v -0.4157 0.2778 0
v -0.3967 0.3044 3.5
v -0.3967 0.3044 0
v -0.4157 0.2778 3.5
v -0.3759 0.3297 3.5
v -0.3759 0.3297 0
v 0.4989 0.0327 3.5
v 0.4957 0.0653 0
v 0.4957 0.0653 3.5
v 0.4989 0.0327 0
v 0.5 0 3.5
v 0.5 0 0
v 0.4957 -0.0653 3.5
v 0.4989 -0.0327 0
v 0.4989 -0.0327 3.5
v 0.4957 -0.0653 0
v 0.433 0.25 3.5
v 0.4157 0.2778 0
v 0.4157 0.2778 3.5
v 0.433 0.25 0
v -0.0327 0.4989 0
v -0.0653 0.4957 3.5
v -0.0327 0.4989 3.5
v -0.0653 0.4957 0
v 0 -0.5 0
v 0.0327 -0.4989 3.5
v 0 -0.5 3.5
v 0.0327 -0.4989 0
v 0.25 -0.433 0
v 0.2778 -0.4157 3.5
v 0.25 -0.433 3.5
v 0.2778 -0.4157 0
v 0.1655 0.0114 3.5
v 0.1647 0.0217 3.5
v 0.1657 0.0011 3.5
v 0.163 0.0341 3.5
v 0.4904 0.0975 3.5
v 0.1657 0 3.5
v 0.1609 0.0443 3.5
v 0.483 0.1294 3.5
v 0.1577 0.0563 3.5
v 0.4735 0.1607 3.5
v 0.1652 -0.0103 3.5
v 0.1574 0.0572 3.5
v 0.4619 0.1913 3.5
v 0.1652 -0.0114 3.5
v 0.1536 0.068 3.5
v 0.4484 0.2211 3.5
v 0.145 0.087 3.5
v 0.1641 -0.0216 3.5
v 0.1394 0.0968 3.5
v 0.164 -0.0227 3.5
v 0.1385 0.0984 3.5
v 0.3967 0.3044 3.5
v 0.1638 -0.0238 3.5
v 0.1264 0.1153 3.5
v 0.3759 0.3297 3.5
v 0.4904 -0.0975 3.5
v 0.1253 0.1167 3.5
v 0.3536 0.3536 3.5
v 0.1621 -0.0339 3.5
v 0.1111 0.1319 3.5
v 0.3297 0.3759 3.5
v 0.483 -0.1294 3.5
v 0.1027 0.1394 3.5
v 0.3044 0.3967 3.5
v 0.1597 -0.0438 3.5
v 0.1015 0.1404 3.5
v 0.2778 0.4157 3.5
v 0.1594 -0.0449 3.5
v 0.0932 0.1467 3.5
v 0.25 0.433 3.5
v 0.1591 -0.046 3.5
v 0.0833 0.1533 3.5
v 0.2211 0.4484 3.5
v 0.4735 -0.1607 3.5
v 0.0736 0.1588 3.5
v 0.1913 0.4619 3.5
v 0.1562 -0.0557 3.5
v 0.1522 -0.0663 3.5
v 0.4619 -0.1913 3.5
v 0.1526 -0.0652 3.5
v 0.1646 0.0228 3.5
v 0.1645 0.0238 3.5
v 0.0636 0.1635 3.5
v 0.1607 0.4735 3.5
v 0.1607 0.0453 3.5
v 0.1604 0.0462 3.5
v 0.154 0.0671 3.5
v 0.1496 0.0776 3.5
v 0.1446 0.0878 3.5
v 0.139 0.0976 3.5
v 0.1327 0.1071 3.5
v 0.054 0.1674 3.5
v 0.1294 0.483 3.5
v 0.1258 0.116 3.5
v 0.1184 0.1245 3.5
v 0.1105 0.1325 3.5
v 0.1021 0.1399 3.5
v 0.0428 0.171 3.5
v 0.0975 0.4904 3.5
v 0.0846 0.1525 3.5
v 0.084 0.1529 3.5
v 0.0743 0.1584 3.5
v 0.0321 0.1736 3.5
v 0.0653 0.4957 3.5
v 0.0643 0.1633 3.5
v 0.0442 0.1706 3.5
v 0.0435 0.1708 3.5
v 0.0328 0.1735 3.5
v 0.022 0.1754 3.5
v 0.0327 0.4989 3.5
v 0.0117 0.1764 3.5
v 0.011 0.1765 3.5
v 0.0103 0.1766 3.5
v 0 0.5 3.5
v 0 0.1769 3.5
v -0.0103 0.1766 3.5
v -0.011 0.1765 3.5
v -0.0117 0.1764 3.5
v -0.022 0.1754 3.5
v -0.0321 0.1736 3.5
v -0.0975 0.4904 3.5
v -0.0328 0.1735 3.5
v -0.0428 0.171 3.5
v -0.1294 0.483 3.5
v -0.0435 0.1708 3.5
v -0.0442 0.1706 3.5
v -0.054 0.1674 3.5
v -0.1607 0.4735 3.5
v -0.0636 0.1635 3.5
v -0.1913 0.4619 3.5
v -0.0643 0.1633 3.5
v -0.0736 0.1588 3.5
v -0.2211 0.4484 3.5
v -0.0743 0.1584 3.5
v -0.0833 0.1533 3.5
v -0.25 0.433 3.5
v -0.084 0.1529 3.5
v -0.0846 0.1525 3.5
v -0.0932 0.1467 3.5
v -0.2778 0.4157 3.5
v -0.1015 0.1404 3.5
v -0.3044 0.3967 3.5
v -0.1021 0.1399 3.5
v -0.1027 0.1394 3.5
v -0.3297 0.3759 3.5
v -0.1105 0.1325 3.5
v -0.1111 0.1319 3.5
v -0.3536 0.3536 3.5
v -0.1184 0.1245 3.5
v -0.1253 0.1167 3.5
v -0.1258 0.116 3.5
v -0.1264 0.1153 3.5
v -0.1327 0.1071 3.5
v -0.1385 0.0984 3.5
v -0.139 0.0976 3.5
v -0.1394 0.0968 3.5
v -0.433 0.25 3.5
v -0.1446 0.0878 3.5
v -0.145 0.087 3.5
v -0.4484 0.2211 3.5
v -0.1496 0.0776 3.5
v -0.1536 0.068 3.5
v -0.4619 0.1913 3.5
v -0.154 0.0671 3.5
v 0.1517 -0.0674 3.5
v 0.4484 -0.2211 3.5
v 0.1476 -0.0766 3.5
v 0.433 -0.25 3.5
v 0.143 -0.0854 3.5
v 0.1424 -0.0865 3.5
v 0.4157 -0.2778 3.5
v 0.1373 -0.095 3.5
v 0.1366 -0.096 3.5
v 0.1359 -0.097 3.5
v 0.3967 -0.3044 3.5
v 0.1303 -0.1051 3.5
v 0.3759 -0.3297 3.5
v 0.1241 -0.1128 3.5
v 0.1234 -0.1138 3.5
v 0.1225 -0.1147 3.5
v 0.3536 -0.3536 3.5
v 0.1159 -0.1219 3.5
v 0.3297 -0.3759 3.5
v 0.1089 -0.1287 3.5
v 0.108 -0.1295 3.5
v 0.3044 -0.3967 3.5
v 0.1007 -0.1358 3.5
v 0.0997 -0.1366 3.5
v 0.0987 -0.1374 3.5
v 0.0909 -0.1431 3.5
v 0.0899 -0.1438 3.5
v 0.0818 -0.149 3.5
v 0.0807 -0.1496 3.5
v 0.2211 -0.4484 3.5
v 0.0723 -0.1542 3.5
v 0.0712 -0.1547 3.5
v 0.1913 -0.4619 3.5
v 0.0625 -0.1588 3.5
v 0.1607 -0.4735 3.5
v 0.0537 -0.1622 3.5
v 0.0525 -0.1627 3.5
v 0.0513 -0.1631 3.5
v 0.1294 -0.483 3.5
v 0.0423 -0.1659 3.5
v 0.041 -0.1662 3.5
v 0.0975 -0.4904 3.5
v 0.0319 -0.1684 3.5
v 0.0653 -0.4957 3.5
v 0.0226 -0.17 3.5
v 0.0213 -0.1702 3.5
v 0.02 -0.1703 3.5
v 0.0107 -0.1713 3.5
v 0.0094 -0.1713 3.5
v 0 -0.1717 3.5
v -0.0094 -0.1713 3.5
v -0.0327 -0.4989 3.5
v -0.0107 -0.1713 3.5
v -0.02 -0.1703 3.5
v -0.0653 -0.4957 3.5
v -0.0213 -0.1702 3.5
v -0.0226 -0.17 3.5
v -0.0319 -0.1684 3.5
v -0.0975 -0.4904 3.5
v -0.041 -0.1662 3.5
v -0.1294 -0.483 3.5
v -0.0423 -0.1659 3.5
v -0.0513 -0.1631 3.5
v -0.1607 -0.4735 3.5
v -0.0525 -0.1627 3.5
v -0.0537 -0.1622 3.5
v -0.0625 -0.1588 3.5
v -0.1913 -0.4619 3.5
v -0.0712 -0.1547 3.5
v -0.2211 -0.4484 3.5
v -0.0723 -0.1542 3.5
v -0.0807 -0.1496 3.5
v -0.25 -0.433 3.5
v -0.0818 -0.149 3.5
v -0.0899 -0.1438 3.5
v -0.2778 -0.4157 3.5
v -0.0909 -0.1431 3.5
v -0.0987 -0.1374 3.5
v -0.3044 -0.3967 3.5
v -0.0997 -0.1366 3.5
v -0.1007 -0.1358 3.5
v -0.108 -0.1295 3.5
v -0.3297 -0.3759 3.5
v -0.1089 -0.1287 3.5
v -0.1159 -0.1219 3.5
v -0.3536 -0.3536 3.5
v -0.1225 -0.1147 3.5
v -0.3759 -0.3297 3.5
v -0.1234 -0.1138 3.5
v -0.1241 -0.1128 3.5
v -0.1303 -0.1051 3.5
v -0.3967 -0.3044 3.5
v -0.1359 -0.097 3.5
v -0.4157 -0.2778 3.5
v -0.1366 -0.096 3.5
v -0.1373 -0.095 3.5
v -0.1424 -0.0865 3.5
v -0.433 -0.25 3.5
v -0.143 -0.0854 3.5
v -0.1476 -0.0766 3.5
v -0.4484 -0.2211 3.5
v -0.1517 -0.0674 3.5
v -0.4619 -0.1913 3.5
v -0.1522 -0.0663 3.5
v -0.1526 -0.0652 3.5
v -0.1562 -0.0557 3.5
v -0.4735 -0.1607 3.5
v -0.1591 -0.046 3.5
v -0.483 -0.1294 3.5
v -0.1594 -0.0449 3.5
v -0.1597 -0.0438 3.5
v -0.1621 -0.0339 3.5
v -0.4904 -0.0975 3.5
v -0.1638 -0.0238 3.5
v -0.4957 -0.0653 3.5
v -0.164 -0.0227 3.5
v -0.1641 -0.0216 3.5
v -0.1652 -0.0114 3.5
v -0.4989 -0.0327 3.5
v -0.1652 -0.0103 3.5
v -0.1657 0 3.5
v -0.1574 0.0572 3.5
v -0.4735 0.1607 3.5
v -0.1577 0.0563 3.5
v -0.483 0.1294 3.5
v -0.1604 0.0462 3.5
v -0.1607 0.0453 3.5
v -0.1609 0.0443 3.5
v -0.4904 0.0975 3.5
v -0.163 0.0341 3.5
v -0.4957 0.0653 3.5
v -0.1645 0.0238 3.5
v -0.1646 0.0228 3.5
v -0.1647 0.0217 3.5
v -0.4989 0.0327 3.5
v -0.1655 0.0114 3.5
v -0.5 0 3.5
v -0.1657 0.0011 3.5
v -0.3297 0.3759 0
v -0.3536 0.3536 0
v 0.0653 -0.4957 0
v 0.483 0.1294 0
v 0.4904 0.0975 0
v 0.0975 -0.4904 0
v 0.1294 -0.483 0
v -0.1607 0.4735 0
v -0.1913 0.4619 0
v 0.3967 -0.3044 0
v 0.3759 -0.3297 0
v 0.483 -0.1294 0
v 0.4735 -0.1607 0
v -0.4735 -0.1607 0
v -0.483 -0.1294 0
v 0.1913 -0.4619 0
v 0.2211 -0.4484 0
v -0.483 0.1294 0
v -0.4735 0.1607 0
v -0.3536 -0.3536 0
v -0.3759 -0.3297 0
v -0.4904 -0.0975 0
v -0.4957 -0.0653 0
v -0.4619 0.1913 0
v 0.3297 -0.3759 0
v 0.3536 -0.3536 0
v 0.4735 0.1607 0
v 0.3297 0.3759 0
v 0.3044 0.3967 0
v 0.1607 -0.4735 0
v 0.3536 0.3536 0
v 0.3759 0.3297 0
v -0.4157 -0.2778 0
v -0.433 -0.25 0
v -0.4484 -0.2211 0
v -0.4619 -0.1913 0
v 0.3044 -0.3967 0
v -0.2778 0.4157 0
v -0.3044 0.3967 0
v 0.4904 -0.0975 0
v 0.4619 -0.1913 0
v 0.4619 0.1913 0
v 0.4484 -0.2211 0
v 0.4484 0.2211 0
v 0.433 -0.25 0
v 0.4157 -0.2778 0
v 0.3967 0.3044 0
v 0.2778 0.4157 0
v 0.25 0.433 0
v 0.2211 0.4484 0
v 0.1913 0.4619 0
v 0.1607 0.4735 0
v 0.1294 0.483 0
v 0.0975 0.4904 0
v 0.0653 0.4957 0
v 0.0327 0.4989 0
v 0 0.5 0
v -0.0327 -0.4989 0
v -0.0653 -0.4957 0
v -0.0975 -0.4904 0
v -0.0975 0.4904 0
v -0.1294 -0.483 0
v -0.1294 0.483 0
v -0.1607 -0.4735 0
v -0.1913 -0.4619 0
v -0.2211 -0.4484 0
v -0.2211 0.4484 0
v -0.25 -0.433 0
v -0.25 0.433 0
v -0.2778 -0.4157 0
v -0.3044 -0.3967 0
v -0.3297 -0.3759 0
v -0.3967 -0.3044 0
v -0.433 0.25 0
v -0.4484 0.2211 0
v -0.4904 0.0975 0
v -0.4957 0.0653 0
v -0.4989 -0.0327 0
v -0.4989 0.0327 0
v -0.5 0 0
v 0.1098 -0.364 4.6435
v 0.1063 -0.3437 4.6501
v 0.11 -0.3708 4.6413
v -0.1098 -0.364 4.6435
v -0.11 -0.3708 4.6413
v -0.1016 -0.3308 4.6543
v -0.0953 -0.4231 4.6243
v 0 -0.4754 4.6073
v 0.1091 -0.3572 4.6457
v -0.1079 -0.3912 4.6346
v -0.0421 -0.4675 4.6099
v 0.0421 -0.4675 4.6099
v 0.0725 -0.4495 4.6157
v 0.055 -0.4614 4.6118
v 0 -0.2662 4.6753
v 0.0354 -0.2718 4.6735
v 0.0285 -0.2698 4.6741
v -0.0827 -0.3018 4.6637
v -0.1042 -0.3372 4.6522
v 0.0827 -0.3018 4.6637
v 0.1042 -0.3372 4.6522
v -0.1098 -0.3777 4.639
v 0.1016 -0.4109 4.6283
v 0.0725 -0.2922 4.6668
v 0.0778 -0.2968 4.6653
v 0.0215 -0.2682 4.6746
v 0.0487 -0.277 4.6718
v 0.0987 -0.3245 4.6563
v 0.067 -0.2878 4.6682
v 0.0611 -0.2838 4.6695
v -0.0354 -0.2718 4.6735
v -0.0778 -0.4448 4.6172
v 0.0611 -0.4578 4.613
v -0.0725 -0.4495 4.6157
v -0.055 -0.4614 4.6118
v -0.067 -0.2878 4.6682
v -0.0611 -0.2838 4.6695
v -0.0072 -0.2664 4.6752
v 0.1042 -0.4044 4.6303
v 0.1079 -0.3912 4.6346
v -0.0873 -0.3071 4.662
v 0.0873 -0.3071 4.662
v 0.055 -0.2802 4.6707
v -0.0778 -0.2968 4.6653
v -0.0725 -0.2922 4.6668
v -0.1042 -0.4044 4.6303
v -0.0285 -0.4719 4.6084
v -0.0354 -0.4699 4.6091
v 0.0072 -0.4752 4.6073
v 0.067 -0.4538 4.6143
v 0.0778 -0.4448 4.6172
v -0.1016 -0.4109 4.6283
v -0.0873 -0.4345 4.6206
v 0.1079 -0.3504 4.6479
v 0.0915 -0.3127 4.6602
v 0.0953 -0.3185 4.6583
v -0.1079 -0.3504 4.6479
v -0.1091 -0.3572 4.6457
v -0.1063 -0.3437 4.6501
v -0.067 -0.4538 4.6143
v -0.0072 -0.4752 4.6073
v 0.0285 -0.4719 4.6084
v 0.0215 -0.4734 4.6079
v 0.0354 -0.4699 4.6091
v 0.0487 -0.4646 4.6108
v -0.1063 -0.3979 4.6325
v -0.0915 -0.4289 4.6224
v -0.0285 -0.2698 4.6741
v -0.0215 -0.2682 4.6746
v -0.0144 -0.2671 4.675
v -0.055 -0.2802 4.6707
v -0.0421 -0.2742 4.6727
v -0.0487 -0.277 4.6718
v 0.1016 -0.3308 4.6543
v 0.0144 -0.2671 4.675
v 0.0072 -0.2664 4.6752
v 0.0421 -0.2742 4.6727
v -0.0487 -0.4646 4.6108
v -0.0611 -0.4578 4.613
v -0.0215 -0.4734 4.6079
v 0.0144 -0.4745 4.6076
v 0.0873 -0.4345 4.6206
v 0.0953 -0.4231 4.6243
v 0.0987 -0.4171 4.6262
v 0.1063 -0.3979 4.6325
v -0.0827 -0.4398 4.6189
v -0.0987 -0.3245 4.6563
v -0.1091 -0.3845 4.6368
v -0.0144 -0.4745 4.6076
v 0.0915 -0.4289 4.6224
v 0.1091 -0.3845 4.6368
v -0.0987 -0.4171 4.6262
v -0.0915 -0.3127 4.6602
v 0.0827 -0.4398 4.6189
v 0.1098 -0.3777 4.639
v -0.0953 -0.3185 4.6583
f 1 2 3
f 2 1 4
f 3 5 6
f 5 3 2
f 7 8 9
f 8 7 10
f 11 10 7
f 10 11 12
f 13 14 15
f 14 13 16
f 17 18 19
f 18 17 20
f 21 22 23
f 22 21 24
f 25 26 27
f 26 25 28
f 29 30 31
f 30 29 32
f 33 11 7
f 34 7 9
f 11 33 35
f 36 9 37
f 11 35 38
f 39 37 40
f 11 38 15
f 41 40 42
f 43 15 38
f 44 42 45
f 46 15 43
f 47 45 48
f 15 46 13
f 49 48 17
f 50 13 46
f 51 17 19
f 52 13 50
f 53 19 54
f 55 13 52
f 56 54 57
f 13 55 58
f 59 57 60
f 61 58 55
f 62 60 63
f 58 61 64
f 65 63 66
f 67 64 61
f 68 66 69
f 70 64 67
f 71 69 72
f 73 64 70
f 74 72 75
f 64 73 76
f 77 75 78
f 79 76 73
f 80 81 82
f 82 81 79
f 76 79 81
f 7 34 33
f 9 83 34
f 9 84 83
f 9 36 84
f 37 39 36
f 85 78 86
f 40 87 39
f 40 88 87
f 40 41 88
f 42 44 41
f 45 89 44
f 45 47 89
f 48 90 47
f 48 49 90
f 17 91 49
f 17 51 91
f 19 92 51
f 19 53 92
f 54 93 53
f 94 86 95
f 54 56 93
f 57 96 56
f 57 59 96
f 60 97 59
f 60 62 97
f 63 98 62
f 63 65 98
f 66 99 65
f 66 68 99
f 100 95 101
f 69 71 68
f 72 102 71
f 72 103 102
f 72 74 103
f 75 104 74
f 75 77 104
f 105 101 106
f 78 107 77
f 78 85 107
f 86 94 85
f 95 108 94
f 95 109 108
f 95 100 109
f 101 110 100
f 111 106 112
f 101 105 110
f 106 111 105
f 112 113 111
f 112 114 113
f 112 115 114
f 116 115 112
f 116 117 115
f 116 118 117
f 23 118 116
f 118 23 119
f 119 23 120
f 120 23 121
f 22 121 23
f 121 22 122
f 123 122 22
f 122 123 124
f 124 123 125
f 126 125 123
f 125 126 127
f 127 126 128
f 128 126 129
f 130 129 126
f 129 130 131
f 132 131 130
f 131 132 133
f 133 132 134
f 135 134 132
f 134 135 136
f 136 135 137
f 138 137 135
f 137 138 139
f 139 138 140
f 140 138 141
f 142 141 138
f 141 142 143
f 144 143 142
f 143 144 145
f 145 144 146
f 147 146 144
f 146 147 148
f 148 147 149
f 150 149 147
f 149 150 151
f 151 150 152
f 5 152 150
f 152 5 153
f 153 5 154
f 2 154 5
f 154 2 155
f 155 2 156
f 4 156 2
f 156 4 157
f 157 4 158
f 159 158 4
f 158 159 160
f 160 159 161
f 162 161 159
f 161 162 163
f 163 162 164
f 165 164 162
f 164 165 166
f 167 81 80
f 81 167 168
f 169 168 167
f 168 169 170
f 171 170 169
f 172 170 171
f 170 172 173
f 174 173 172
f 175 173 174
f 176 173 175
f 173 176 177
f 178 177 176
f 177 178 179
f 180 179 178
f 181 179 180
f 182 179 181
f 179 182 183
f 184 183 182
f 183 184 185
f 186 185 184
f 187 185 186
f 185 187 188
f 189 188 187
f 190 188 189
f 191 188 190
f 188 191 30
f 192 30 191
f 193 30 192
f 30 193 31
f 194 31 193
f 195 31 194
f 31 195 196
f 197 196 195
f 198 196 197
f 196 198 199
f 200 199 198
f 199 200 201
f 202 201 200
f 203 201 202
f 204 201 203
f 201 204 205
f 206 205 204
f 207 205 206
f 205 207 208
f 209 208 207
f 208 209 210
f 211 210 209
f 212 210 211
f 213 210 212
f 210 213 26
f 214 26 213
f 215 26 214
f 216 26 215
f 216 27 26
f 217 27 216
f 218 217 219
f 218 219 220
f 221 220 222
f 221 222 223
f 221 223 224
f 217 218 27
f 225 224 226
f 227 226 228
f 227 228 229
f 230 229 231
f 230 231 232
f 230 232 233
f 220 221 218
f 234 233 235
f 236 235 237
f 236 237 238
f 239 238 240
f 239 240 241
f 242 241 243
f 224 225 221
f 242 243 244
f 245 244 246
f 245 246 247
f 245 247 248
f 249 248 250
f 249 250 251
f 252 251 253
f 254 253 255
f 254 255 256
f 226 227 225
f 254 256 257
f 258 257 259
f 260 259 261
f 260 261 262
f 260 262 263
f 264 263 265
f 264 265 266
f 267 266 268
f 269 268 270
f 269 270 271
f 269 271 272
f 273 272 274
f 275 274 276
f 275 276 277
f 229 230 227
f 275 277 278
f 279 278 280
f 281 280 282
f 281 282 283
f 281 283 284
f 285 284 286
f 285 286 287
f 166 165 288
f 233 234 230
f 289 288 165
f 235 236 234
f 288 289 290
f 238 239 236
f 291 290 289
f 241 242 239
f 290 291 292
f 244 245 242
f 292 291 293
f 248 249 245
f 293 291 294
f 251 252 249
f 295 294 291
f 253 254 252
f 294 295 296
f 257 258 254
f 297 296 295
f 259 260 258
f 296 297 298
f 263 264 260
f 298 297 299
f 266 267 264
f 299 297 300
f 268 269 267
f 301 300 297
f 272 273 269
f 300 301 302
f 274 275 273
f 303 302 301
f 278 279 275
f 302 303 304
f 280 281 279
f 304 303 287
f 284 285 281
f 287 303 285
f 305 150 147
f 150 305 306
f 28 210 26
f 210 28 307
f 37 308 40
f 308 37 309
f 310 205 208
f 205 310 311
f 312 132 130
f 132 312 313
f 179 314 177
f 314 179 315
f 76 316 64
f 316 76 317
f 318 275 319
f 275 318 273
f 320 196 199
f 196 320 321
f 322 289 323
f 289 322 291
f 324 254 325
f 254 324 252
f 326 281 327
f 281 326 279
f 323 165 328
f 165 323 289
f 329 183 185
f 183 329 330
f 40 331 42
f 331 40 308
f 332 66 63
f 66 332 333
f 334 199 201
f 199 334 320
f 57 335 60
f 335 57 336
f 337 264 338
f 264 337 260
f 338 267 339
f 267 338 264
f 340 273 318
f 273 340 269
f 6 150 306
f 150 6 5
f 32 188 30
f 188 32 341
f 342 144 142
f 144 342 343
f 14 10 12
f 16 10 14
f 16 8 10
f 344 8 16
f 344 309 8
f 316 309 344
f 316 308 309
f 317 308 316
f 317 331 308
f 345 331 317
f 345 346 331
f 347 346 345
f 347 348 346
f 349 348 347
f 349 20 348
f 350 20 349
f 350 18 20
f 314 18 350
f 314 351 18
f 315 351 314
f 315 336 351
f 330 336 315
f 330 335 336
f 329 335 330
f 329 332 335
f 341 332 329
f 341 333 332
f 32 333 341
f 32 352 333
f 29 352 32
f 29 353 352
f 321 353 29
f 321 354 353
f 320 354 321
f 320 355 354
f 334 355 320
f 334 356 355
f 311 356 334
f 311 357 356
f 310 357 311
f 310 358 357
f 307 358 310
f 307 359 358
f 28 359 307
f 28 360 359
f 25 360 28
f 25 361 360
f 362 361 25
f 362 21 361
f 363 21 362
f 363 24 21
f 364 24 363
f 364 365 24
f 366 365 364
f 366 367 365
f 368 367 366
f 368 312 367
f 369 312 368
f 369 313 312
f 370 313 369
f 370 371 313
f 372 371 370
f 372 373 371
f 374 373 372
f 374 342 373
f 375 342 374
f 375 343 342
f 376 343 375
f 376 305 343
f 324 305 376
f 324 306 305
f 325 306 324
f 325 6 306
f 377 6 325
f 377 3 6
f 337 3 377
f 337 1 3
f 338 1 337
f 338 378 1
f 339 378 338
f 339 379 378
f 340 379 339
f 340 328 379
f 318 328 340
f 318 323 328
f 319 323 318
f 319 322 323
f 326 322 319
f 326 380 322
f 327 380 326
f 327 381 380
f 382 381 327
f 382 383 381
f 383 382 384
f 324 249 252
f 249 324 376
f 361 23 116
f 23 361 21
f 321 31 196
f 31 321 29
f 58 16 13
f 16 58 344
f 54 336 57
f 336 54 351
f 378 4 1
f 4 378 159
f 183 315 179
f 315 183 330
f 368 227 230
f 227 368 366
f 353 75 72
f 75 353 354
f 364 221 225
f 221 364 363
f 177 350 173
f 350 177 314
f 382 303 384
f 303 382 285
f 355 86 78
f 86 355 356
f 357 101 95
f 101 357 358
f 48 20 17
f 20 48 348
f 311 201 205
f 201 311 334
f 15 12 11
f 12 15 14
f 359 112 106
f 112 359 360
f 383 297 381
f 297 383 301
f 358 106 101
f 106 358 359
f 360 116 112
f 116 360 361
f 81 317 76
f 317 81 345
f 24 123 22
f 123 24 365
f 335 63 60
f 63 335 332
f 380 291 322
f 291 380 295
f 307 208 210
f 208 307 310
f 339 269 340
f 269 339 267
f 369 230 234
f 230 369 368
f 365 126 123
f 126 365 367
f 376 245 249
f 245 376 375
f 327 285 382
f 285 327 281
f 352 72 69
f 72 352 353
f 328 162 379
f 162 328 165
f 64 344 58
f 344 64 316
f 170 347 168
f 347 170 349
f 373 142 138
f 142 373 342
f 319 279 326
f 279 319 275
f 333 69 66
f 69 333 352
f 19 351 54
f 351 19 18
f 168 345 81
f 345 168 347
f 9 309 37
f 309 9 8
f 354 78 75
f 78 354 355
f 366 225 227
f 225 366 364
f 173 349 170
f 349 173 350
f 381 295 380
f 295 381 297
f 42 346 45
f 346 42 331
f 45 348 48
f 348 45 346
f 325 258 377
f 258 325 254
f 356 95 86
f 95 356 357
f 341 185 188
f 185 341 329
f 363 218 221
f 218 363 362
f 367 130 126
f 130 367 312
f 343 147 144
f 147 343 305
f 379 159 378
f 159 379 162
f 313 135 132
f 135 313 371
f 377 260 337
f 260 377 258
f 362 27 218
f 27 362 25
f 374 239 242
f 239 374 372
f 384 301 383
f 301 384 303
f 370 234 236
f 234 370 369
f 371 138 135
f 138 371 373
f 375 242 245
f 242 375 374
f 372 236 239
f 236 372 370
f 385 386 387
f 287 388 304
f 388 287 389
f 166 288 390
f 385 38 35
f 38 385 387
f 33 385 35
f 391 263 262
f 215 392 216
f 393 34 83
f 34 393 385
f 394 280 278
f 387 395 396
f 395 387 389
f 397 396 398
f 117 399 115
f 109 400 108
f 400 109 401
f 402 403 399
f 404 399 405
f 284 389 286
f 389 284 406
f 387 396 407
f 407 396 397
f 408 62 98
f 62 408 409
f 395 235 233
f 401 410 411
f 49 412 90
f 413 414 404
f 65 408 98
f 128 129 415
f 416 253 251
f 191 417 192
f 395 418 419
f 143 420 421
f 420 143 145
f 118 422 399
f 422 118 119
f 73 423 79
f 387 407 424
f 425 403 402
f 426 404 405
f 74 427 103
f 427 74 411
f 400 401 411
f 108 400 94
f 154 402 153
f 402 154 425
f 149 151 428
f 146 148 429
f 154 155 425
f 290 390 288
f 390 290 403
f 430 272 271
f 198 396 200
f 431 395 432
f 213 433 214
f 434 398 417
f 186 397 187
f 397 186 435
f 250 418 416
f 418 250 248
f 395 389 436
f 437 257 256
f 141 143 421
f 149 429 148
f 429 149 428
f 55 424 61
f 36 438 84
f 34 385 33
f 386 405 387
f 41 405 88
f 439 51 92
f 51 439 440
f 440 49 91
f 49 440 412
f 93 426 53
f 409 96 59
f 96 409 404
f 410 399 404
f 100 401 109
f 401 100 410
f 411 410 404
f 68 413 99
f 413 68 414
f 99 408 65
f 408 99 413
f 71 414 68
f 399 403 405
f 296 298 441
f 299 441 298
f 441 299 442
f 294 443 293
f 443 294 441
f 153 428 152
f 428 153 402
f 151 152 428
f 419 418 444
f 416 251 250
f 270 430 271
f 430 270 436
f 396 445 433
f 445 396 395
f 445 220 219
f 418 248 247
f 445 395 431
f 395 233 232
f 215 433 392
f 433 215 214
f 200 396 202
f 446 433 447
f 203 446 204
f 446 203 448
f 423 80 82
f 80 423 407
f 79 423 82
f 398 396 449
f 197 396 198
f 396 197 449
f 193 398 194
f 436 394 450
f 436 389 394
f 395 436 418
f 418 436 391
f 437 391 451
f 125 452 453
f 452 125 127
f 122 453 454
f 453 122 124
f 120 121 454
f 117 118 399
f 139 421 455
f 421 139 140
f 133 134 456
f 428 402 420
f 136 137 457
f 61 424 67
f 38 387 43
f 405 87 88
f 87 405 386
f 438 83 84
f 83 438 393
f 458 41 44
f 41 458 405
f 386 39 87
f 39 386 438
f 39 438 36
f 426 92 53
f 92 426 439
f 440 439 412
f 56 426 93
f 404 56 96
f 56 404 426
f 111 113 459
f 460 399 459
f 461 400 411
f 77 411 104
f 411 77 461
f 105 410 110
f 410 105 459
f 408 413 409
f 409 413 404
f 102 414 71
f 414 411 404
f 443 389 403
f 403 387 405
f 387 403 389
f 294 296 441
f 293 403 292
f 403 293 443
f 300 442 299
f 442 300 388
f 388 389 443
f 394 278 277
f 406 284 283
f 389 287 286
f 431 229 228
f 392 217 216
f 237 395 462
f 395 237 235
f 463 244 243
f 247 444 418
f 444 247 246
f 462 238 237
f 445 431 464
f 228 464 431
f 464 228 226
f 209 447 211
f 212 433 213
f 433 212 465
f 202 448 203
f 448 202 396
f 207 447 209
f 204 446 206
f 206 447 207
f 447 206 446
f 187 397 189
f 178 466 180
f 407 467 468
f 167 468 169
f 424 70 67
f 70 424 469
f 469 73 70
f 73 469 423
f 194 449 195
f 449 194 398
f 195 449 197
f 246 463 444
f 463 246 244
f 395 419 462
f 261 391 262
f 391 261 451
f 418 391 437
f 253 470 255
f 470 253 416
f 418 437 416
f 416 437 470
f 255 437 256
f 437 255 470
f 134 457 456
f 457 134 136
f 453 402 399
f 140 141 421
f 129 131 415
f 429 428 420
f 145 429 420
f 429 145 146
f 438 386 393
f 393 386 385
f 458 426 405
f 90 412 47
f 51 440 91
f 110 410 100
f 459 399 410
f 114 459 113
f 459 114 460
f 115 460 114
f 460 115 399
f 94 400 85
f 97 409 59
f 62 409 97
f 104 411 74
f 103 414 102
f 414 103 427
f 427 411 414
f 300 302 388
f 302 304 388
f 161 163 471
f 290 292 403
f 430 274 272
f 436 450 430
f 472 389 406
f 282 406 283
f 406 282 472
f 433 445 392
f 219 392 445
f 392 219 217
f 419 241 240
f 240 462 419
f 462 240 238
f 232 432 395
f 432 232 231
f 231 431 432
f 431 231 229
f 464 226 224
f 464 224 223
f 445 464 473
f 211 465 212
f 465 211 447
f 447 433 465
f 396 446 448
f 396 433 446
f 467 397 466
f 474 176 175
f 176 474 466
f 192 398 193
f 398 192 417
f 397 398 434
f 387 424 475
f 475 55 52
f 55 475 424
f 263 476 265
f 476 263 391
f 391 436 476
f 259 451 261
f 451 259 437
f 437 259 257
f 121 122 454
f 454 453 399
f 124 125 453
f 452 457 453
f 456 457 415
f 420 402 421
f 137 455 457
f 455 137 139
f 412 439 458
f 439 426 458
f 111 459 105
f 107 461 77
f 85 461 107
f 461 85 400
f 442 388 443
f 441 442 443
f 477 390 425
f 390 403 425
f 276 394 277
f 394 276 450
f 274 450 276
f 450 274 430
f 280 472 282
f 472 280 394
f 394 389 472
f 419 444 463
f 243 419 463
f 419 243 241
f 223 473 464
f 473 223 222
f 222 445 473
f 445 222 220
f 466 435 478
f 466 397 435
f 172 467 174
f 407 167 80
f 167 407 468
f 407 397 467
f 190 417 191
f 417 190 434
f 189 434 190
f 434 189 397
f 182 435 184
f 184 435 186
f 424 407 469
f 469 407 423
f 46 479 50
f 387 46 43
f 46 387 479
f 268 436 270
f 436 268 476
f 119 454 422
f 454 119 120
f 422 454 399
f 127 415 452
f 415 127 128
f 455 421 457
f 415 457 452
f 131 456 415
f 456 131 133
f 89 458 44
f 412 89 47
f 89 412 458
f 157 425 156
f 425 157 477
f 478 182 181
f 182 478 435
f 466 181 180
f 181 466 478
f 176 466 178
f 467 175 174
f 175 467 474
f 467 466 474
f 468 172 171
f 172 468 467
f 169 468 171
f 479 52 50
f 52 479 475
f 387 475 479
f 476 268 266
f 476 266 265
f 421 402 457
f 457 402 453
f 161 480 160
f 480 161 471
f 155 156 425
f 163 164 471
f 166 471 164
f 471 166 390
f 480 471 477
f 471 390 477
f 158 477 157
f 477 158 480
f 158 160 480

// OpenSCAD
// Toggle switch (miniature) - ONE connected solid
// Target: 1.0mm body diameter, 4.7mm overall height

$fn = 96;

// Parameters
body_diameter_mm   = 1.0;   //[0.5:2.0:0.05]
overall_height_mm  = 4.7;   //[2.35:9.4:0.1]

// Proportions (kept parametric but constrained to match overall height)
body_height_mm     = 3.5;   //[1.75:7.0:0.1]
lever_height_mm    = overall_height_mm - body_height_mm;  // ensures exact overall height
lever_diameter_mm  = 0.35;  //[0.15:0.6:0.01]
lever_tip_d_mm     = 0.22;  //[0.10:0.5:0.01]
connect_overlap_mm = 0.20;  //[0.05:0.6:0.05]
toggle_angle_deg   = 18;    //[-30:30:1]

// Small collar
collar_h_mm        = 0.35;
collar_d_mm        = 0.70;

// Derived
body_r  = body_diameter_mm/2;
lever_r = lever_diameter_mm/2;

module toggle_switch() {
    union() {
        // Main cylindrical body: z = 0 .. body_height_mm
        translate([0, 0, body_height_mm/2])
            cylinder(h=body_height_mm, r=body_r, center=true);

        // Collar at top of body (overlaps slightly into body)
        translate([0, 0, body_height_mm - collar_h_mm/2 - connect_overlap_mm/2])
            cylinder(h=collar_h_mm + connect_overlap_mm, r=collar_d_mm/2, center=true);

        // Lever: rotate about the top of the body so it stays connected
        // Place lever so its bottom is slightly inside the collar/body (overlap)
        translate([0, 0, body_height_mm])
            rotate([toggle_angle_deg, 0, 0])
                translate([0, 0, lever_height_mm/2 - connect_overlap_mm/2])
                    cylinder(h=lever_height_mm + connect_overlap_mm,
                             r1=lever_r, r2=lever_tip_d_mm/2, center=true);
    }
}

toggle_switch();
